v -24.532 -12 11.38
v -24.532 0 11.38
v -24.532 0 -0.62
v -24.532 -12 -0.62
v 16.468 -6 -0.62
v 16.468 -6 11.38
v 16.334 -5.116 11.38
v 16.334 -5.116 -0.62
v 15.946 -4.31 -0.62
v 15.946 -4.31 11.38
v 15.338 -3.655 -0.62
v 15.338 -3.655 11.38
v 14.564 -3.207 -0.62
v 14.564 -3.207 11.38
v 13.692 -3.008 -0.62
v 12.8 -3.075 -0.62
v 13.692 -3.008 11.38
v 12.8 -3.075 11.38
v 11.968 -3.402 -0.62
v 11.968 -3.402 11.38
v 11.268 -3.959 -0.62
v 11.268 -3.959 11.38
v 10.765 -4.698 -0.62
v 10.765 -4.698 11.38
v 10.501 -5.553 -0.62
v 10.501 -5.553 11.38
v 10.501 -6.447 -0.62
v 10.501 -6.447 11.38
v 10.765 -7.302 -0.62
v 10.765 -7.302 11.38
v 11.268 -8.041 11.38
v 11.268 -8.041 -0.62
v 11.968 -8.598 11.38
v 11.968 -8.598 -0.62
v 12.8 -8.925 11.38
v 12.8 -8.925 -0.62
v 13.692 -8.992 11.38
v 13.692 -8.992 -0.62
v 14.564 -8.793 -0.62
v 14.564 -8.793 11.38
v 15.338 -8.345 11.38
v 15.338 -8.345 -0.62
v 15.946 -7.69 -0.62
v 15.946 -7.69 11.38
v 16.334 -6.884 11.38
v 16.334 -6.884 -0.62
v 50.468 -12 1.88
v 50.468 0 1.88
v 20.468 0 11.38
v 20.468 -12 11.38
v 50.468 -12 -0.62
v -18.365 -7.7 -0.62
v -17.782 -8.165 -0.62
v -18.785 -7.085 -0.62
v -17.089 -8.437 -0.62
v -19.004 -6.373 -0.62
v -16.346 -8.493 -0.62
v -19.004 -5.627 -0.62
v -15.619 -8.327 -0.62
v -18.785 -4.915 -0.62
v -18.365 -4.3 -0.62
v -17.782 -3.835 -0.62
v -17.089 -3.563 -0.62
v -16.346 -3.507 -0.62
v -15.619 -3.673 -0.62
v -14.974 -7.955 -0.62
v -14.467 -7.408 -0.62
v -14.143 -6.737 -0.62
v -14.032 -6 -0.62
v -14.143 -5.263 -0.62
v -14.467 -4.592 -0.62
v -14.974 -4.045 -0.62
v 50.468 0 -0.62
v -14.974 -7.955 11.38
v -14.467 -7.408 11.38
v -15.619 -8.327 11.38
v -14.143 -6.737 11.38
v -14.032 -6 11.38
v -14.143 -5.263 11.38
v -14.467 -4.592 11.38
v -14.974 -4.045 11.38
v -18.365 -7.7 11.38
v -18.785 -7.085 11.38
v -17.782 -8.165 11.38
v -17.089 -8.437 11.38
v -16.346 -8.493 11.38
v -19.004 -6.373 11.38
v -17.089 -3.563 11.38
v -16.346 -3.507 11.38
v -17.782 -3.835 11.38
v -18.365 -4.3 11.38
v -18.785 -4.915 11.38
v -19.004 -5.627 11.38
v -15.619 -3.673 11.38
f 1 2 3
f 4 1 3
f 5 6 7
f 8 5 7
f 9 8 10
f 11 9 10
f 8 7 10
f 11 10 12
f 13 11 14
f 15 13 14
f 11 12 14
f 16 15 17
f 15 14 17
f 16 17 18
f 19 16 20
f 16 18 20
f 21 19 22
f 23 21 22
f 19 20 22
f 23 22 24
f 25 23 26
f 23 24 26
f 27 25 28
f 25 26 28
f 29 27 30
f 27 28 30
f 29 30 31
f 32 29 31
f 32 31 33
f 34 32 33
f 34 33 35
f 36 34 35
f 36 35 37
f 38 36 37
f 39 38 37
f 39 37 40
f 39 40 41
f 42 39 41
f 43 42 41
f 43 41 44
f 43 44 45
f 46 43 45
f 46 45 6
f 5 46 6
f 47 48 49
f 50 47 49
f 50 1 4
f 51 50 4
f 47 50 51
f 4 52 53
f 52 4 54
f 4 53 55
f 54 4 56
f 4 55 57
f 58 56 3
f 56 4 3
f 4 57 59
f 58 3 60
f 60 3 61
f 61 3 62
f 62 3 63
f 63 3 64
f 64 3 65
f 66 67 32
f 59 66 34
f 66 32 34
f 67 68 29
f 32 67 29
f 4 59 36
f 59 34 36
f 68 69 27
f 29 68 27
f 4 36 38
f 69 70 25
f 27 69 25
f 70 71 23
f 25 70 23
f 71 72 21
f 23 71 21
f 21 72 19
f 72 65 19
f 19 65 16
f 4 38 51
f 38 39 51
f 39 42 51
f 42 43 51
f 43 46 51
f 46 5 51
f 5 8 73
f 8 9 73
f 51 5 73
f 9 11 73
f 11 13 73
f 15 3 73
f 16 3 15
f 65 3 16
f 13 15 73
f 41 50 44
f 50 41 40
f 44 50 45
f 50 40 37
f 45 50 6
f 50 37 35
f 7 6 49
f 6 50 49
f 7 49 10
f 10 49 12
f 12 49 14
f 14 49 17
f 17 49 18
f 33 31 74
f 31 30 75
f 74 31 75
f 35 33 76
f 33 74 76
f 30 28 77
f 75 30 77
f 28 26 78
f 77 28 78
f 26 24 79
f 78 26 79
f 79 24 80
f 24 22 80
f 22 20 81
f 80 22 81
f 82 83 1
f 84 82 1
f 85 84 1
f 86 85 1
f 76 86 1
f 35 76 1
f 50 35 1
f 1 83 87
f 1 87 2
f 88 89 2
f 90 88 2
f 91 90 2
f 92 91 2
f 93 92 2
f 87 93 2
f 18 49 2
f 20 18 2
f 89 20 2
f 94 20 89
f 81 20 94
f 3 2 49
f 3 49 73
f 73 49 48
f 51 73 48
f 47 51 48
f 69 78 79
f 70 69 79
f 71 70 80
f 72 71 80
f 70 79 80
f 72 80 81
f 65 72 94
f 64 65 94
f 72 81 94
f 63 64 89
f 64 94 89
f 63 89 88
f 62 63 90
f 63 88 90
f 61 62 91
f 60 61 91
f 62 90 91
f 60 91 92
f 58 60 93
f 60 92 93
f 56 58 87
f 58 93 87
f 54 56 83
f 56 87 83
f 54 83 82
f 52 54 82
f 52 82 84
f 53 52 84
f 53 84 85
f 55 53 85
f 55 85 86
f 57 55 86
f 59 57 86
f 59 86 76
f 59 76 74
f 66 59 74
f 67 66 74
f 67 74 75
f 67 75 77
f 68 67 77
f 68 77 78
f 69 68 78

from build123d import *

# Parameters (mm, degrees)
F1_DEPTH = 12
F2_R     = 2.5
F2_R_2   = 3
F3_DEPTH = 25


with BuildPart() as f1:
    # F0 (on Front) → F1 (new body)
    with BuildSketch(Plane.XZ):
        Polygon((20.467626, 11.379912), (-24.532374, 11.379912), (-24.532374, -0.620088), (50.467626, -0.620088), (50.467626, 1.879912), align=None)
    extrude(amount=F1_DEPTH)

    # F2 (on face) → F3 (cut)
    with BuildSketch(Plane.XY.offset(11.379912)):
        with Locations((-16.532374, -6)):
            Circle(F2_R)
        with Locations((13.467626, -6)):
            Circle(F2_R_2)
    extrude(amount=-F3_DEPTH, mode=Mode.SUBTRACT)


solid = f1.part
